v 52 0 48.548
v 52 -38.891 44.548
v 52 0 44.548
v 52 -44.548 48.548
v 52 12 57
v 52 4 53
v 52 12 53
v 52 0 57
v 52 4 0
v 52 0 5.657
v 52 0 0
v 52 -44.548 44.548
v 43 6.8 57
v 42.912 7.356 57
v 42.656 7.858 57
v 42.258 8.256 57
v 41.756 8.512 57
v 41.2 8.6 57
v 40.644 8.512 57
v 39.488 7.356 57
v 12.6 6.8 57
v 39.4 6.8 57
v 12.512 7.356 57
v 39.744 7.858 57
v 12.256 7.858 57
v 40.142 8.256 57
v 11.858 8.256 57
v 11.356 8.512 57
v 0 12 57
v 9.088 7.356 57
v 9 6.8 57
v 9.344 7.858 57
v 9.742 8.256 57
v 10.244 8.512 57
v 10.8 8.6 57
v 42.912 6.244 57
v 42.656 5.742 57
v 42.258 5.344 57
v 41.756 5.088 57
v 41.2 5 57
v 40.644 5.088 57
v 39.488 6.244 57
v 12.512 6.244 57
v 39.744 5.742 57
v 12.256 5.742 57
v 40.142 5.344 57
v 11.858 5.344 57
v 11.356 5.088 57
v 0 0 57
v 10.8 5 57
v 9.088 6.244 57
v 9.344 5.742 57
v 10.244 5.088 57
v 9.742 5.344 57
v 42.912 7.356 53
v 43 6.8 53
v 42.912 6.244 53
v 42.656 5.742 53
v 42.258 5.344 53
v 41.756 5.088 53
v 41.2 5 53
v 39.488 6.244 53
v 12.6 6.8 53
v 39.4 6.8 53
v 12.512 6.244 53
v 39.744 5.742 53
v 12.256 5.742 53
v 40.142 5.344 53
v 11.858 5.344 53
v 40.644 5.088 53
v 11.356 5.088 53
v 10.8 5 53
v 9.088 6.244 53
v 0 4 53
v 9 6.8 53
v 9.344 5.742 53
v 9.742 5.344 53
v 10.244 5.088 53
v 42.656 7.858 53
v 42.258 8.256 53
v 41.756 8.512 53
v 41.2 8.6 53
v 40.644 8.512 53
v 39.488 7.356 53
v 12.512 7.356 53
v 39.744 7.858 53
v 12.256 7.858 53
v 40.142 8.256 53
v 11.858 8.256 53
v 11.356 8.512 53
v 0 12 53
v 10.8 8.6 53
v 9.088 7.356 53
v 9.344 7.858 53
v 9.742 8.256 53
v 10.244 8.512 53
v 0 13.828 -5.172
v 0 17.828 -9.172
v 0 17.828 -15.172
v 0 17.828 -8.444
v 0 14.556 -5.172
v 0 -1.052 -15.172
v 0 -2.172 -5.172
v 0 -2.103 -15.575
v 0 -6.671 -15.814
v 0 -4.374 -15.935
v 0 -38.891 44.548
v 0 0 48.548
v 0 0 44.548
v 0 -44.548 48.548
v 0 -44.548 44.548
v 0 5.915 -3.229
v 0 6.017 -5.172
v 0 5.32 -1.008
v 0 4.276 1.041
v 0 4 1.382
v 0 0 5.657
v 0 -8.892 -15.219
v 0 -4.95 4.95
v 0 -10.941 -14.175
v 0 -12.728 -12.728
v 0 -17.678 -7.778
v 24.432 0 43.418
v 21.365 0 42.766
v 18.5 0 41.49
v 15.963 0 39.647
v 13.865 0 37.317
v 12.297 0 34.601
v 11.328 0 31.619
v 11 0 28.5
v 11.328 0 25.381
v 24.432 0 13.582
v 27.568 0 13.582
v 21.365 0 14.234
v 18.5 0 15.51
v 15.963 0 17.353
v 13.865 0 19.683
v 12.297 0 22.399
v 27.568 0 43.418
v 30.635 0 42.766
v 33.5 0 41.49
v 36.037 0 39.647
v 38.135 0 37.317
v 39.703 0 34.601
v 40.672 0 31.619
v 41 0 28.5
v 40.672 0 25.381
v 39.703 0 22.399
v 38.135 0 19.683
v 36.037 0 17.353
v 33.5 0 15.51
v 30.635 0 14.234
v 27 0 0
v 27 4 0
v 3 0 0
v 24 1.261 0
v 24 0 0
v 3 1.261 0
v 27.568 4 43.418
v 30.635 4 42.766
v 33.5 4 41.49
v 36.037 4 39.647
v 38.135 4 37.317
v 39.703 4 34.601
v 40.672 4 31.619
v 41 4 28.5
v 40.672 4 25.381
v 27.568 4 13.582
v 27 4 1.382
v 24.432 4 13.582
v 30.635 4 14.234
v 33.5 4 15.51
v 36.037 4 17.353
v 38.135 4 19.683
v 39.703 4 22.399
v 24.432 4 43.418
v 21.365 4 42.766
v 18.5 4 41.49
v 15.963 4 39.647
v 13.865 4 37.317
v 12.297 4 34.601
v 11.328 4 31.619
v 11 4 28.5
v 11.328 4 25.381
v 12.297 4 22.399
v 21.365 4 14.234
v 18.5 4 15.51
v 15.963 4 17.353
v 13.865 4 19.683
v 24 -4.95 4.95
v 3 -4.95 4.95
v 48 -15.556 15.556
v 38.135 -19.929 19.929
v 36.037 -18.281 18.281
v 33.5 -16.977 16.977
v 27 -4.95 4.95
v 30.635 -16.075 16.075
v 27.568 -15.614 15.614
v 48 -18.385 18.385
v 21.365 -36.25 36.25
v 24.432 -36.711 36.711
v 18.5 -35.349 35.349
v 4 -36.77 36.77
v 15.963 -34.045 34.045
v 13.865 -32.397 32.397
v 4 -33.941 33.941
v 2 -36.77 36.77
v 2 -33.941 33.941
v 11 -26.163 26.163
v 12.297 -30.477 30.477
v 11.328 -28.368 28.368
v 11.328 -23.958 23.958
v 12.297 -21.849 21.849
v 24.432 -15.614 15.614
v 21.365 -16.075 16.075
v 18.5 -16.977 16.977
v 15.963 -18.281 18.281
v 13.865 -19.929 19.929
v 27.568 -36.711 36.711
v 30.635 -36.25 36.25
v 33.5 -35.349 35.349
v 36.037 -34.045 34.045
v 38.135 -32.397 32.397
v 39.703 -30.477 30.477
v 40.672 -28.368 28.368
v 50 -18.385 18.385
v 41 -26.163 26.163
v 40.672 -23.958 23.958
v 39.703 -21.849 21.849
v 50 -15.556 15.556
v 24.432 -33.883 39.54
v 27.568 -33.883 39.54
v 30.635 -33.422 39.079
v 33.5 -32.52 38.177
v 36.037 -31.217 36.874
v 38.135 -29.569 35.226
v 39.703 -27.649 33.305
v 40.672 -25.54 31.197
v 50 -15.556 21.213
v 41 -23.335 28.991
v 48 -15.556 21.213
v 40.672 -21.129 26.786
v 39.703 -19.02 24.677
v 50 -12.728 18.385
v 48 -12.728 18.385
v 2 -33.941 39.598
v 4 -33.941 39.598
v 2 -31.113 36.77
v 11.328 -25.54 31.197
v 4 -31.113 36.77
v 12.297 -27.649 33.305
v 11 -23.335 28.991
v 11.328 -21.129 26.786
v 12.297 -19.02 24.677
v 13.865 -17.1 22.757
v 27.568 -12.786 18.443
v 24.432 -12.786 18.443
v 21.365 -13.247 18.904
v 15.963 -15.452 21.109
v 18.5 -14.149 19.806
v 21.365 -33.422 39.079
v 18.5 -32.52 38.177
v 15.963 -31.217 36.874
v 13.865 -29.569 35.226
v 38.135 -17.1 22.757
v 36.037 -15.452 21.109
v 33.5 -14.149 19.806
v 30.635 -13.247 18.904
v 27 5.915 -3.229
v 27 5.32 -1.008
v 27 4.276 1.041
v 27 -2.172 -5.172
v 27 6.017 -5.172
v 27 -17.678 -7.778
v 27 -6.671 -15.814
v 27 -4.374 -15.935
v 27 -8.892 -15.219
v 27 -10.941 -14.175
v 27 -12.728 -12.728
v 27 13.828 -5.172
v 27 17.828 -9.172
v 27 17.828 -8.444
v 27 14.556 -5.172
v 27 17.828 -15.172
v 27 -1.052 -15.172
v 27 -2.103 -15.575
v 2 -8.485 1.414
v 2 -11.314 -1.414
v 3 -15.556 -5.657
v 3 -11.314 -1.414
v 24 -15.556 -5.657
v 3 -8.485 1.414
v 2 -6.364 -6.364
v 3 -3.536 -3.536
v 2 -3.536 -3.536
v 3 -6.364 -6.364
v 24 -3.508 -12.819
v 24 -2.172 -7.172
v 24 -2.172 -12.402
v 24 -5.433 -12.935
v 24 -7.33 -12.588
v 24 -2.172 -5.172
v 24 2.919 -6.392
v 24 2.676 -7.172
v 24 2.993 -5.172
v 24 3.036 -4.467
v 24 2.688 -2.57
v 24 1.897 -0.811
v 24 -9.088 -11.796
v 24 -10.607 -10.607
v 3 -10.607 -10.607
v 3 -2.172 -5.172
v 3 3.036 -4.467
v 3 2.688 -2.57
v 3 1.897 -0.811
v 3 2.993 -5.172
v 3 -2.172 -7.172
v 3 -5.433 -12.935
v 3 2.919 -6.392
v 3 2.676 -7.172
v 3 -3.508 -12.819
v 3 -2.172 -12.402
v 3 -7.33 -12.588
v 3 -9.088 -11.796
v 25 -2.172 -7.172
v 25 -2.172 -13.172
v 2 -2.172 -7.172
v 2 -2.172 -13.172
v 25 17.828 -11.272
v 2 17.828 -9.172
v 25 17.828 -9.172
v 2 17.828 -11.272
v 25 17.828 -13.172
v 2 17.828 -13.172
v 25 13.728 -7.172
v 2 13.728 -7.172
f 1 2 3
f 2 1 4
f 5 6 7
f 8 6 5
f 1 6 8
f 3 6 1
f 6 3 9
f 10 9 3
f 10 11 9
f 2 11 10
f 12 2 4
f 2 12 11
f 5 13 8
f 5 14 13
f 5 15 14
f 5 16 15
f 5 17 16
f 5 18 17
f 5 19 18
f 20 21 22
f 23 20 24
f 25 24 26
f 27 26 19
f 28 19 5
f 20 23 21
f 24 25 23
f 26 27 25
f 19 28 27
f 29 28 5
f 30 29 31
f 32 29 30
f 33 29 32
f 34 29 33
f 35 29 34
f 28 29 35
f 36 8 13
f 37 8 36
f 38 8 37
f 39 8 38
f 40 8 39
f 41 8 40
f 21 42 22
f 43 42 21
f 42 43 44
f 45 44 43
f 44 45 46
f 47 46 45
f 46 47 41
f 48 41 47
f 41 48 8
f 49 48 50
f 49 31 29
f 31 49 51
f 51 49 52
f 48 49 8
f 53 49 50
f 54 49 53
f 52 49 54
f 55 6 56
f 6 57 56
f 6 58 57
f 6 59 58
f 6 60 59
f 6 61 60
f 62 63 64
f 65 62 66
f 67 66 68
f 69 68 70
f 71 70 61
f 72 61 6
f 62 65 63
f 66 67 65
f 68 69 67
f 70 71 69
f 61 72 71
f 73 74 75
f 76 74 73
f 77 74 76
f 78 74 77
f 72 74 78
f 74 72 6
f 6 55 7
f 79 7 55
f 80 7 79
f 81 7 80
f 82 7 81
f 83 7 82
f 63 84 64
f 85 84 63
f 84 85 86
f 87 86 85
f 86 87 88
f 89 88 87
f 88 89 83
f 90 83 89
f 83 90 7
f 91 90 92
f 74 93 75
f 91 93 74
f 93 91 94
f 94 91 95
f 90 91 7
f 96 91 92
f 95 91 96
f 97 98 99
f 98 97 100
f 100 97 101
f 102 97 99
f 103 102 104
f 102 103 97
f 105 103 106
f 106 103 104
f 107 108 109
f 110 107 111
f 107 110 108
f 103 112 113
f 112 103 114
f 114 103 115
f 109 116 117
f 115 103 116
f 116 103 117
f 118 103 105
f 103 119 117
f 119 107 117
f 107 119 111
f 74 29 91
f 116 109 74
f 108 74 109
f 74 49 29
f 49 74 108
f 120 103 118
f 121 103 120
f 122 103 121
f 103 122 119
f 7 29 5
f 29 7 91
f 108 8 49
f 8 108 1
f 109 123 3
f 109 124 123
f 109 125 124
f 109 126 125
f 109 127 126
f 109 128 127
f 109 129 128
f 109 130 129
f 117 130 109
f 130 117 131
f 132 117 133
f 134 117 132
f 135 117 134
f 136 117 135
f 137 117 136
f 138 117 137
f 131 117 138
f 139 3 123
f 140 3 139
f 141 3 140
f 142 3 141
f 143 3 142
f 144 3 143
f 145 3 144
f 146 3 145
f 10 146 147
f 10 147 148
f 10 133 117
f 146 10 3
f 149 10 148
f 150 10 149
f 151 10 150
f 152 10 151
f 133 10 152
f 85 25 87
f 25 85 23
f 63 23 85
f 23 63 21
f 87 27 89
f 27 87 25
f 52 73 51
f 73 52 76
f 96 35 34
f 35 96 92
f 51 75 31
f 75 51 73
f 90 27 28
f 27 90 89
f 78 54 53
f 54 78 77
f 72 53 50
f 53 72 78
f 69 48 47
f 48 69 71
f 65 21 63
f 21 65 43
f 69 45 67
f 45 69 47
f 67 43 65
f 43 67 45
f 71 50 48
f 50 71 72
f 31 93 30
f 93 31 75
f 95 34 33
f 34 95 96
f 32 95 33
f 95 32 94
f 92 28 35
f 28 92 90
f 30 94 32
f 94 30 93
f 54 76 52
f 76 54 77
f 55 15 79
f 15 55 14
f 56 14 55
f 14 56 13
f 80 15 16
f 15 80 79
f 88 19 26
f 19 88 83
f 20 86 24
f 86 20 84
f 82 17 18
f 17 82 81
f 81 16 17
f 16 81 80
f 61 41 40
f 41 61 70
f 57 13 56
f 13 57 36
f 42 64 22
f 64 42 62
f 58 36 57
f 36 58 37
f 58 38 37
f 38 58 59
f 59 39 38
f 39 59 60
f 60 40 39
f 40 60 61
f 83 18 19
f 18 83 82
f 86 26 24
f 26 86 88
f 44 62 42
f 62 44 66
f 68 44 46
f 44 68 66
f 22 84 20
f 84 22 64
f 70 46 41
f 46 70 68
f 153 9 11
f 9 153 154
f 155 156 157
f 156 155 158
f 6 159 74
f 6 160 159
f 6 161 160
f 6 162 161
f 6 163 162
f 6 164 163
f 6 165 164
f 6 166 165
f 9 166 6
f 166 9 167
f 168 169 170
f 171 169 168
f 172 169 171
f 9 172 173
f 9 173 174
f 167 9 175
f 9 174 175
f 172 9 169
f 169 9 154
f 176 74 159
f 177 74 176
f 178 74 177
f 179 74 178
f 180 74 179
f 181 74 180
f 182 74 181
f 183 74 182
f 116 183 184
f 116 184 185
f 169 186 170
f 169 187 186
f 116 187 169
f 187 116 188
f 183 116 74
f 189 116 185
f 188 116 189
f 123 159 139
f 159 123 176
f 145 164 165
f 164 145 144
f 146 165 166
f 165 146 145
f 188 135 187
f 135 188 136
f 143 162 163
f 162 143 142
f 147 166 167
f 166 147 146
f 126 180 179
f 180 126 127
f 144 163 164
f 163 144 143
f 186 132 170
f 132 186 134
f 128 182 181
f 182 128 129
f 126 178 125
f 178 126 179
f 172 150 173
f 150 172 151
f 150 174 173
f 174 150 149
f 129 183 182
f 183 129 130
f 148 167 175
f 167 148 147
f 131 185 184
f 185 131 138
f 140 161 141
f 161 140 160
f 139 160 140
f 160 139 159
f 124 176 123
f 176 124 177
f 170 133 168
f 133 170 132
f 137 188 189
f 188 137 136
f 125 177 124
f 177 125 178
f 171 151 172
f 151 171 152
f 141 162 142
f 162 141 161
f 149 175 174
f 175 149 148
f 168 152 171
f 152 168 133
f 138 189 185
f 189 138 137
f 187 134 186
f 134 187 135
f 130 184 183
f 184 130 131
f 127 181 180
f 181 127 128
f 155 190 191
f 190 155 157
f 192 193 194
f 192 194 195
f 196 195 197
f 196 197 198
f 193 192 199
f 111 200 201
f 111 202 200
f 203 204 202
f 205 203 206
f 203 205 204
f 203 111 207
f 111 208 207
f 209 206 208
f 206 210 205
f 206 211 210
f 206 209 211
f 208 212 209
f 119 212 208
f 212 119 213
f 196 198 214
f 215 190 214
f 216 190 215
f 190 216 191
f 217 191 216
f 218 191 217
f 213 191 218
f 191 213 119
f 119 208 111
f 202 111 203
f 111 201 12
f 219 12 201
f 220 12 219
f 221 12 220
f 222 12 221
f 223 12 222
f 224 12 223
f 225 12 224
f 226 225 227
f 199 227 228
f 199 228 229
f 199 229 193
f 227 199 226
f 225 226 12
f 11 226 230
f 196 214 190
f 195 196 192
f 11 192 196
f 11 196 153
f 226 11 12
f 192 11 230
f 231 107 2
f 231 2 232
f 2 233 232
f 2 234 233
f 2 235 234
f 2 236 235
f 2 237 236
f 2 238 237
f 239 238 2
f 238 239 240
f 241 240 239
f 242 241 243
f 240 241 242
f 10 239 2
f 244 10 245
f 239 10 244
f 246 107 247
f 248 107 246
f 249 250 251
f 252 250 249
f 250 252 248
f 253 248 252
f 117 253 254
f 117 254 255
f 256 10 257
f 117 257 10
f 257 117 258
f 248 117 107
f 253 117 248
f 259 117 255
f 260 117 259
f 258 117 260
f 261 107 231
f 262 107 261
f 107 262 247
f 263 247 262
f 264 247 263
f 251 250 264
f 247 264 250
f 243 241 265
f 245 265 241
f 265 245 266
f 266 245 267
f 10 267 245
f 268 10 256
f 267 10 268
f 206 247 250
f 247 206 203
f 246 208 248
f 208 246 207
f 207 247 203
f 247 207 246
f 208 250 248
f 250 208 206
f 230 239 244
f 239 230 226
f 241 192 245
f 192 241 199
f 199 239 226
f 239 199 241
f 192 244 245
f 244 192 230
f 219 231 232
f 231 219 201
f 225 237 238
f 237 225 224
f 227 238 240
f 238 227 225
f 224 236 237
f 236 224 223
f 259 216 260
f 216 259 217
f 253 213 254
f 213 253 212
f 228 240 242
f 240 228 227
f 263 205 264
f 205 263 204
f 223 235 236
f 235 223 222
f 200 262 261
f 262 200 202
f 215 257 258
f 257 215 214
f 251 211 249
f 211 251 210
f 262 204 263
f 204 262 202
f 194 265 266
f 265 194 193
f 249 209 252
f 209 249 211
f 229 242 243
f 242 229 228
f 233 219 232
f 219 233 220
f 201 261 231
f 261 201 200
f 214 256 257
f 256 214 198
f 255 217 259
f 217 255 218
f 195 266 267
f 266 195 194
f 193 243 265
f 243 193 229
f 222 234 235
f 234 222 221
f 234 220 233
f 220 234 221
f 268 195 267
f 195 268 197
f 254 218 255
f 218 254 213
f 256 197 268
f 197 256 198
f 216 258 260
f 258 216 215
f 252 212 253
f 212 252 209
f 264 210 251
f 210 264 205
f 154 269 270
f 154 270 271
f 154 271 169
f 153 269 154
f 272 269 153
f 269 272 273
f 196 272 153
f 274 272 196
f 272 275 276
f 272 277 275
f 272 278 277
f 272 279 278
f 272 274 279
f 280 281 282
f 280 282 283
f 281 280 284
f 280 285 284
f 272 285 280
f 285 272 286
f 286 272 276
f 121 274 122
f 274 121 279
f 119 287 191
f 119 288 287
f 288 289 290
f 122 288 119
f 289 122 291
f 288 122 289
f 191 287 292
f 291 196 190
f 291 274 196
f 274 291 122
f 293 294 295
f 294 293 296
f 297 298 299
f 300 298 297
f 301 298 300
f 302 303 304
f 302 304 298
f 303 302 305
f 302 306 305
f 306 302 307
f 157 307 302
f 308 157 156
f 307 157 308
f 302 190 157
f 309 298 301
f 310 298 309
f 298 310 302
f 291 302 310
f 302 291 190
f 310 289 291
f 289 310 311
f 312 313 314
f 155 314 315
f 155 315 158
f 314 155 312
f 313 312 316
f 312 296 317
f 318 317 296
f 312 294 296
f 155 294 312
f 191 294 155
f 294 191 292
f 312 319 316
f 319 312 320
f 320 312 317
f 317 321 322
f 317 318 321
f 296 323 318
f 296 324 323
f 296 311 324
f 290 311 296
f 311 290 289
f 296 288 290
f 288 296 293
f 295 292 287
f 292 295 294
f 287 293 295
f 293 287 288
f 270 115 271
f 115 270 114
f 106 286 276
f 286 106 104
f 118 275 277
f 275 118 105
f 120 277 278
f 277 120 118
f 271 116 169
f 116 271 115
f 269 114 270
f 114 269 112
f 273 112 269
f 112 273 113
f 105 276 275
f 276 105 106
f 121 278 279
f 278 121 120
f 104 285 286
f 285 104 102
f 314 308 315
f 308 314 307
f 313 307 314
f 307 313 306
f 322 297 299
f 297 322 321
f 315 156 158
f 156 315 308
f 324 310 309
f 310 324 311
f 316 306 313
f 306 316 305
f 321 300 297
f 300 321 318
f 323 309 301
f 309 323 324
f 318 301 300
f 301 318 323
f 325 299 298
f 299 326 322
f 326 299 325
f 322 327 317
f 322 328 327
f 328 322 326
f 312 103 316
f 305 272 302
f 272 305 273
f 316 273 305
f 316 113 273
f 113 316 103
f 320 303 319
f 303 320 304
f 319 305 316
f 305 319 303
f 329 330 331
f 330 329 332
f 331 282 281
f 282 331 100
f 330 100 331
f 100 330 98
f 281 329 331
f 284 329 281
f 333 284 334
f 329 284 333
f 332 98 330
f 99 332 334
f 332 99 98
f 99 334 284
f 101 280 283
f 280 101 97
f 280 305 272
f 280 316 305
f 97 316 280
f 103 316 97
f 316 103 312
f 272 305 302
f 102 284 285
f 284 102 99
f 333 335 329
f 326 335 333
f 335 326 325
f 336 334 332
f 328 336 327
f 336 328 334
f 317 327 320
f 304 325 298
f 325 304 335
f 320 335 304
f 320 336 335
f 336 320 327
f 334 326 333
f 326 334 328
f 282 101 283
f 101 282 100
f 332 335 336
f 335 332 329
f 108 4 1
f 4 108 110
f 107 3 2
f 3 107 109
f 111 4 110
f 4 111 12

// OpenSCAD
//Крепление к экструдеру
THICKNESS = 4;		//толщина
MOUNT_HEIGHT = 57;	//высота крепления
WIDTH = 52;			//ширина
GAB = 12;			//вынос
HOLE_X = 9;			// положение отверстий крепления по X
HOLE_Y = 5;			// положение отверстий крепления по Y
HOLE_DIAM = 3.6;	//диаметр отверстий под крепление
DIAM_HOLE_LIGHT = 30;	//диаметр отверстий для облегчения конструкции

//Крепление куллера
COOL_HEIGHT = 63;	//длина крепленияпод куллер
COOL_ANGL = 45;		//угол крепления куллера
COOL_HOLESIZE_X = 2;	//размеры крепления под куллер
COOL_HOLESIZE_Y = 4;	
COOL_HOLE_X = 2;
COOL_HOLE_Y = 11;


difference()
{
    translate([0, 0, MOUNT_HEIGHT-THICKNESS]) cube([WIDTH,GAB,THICKNESS]);
    translate([HOLE_X+HOLE_DIAM/2, HOLE_Y+HOLE_DIAM/2, MOUNT_HEIGHT-THICKNESS]) cylinder(h=THICKNESS, d=HOLE_DIAM, $fn=20);
	translate([WIDTH-(HOLE_X+HOLE_DIAM/2), HOLE_Y+HOLE_DIAM/2,MOUNT_HEIGHT-THICKNESS]) cylinder(h=THICKNESS, d=HOLE_DIAM, $fn = 20);
}
difference()
{
	cube([WIDTH,THICKNESS,MOUNT_HEIGHT]);
	translate([WIDTH/2, THICKNESS, MOUNT_HEIGHT/2]) rotate([90, 0, 0]) cylinder(d=DIAM_HOLE_LIGHT, h=THICKNESS);
}




translate([0, THICKNESS*cos(COOL_ANGL), THICKNESS*sin(COOL_ANGL)]) rotate([90+COOL_ANGL,0,0])
union()
{	
	difference()
	{
		cube([WIDTH,COOL_HEIGHT,THICKNESS]);
		translate([COOL_HOLE_X,COOL_HEIGHT-COOL_HOLE_Y-COOL_HOLESIZE_Y,0]) cube([COOL_HOLESIZE_X,COOL_HOLESIZE_Y,THICKNESS]);
		translate([WIDTH-COOL_HOLESIZE_X-COOL_HOLE_X,COOL_HEIGHT-WIDTH+COOL_HOLE_Y, 0]) cube([COOL_HOLESIZE_X,COOL_HOLESIZE_Y,THICKNESS]);
		translate([WIDTH/2,COOL_HEIGHT-WIDTH/2,0]) cylinder(d=DIAM_HOLE_LIGHT,h=THICKNESS);
	}
	difference()
	{
		cube([27,7,22]);
		translate([3,0,3]) cube([21,7,16]);
		translate([2,0,9]) cube([1,7,4]);
	}
	difference()
	{
		intersection()
		{
			translate([0,-15,0])cube([27,15,22]);
			translate([0,0,11]) rotate([0,90,0]) cylinder(d=22,h=27);
		}
		translate([3,0,11]) rotate([0,90,0]) cylinder(d=16,h=21);
		rotate([-COOL_ANGL,0,0])translate([0,-18,-25]) cube([27,10,30]);
	}
	rotate([-COOL_ANGL,0,0])translate([0,-18,-15]) union(){
	
		difference()
		{
			cube([27,10,23]);
			translate([2,2,0]) cube([23,6,23]);
			translate([0,18,15]) rotate([COOL_ANGL,0,0]) #intersection()
			{
				translate([3,0,11]) rotate([0,90,0]) cylinder(d=16,h=21);
				rotate([-COOL_ANGL,0,0])translate([0,-18,-15])cube([27,10,24]);
			}
			
			translate([0,5,-1]) rotate([-45,0,0]) cube([27,10,10]);
			
		}
		difference()
		{
			translate([0,0,6]) rotate([-45,0,0]) translate([0,7,-2])cube([27,2,10]);
			translate([0,0,-10]) cube([27,10,10]);
			translate([0,10,0]) cube([27,10,10]);
		}
	}
	
}

translate([0,-COOL_HEIGHT*cos(90-COOL_ANGL),COOL_HEIGHT*sin(90-COOL_ANGL)]) cube([WIDTH,COOL_HEIGHT*cos(90-COOL_ANGL),THICKNESS]);
